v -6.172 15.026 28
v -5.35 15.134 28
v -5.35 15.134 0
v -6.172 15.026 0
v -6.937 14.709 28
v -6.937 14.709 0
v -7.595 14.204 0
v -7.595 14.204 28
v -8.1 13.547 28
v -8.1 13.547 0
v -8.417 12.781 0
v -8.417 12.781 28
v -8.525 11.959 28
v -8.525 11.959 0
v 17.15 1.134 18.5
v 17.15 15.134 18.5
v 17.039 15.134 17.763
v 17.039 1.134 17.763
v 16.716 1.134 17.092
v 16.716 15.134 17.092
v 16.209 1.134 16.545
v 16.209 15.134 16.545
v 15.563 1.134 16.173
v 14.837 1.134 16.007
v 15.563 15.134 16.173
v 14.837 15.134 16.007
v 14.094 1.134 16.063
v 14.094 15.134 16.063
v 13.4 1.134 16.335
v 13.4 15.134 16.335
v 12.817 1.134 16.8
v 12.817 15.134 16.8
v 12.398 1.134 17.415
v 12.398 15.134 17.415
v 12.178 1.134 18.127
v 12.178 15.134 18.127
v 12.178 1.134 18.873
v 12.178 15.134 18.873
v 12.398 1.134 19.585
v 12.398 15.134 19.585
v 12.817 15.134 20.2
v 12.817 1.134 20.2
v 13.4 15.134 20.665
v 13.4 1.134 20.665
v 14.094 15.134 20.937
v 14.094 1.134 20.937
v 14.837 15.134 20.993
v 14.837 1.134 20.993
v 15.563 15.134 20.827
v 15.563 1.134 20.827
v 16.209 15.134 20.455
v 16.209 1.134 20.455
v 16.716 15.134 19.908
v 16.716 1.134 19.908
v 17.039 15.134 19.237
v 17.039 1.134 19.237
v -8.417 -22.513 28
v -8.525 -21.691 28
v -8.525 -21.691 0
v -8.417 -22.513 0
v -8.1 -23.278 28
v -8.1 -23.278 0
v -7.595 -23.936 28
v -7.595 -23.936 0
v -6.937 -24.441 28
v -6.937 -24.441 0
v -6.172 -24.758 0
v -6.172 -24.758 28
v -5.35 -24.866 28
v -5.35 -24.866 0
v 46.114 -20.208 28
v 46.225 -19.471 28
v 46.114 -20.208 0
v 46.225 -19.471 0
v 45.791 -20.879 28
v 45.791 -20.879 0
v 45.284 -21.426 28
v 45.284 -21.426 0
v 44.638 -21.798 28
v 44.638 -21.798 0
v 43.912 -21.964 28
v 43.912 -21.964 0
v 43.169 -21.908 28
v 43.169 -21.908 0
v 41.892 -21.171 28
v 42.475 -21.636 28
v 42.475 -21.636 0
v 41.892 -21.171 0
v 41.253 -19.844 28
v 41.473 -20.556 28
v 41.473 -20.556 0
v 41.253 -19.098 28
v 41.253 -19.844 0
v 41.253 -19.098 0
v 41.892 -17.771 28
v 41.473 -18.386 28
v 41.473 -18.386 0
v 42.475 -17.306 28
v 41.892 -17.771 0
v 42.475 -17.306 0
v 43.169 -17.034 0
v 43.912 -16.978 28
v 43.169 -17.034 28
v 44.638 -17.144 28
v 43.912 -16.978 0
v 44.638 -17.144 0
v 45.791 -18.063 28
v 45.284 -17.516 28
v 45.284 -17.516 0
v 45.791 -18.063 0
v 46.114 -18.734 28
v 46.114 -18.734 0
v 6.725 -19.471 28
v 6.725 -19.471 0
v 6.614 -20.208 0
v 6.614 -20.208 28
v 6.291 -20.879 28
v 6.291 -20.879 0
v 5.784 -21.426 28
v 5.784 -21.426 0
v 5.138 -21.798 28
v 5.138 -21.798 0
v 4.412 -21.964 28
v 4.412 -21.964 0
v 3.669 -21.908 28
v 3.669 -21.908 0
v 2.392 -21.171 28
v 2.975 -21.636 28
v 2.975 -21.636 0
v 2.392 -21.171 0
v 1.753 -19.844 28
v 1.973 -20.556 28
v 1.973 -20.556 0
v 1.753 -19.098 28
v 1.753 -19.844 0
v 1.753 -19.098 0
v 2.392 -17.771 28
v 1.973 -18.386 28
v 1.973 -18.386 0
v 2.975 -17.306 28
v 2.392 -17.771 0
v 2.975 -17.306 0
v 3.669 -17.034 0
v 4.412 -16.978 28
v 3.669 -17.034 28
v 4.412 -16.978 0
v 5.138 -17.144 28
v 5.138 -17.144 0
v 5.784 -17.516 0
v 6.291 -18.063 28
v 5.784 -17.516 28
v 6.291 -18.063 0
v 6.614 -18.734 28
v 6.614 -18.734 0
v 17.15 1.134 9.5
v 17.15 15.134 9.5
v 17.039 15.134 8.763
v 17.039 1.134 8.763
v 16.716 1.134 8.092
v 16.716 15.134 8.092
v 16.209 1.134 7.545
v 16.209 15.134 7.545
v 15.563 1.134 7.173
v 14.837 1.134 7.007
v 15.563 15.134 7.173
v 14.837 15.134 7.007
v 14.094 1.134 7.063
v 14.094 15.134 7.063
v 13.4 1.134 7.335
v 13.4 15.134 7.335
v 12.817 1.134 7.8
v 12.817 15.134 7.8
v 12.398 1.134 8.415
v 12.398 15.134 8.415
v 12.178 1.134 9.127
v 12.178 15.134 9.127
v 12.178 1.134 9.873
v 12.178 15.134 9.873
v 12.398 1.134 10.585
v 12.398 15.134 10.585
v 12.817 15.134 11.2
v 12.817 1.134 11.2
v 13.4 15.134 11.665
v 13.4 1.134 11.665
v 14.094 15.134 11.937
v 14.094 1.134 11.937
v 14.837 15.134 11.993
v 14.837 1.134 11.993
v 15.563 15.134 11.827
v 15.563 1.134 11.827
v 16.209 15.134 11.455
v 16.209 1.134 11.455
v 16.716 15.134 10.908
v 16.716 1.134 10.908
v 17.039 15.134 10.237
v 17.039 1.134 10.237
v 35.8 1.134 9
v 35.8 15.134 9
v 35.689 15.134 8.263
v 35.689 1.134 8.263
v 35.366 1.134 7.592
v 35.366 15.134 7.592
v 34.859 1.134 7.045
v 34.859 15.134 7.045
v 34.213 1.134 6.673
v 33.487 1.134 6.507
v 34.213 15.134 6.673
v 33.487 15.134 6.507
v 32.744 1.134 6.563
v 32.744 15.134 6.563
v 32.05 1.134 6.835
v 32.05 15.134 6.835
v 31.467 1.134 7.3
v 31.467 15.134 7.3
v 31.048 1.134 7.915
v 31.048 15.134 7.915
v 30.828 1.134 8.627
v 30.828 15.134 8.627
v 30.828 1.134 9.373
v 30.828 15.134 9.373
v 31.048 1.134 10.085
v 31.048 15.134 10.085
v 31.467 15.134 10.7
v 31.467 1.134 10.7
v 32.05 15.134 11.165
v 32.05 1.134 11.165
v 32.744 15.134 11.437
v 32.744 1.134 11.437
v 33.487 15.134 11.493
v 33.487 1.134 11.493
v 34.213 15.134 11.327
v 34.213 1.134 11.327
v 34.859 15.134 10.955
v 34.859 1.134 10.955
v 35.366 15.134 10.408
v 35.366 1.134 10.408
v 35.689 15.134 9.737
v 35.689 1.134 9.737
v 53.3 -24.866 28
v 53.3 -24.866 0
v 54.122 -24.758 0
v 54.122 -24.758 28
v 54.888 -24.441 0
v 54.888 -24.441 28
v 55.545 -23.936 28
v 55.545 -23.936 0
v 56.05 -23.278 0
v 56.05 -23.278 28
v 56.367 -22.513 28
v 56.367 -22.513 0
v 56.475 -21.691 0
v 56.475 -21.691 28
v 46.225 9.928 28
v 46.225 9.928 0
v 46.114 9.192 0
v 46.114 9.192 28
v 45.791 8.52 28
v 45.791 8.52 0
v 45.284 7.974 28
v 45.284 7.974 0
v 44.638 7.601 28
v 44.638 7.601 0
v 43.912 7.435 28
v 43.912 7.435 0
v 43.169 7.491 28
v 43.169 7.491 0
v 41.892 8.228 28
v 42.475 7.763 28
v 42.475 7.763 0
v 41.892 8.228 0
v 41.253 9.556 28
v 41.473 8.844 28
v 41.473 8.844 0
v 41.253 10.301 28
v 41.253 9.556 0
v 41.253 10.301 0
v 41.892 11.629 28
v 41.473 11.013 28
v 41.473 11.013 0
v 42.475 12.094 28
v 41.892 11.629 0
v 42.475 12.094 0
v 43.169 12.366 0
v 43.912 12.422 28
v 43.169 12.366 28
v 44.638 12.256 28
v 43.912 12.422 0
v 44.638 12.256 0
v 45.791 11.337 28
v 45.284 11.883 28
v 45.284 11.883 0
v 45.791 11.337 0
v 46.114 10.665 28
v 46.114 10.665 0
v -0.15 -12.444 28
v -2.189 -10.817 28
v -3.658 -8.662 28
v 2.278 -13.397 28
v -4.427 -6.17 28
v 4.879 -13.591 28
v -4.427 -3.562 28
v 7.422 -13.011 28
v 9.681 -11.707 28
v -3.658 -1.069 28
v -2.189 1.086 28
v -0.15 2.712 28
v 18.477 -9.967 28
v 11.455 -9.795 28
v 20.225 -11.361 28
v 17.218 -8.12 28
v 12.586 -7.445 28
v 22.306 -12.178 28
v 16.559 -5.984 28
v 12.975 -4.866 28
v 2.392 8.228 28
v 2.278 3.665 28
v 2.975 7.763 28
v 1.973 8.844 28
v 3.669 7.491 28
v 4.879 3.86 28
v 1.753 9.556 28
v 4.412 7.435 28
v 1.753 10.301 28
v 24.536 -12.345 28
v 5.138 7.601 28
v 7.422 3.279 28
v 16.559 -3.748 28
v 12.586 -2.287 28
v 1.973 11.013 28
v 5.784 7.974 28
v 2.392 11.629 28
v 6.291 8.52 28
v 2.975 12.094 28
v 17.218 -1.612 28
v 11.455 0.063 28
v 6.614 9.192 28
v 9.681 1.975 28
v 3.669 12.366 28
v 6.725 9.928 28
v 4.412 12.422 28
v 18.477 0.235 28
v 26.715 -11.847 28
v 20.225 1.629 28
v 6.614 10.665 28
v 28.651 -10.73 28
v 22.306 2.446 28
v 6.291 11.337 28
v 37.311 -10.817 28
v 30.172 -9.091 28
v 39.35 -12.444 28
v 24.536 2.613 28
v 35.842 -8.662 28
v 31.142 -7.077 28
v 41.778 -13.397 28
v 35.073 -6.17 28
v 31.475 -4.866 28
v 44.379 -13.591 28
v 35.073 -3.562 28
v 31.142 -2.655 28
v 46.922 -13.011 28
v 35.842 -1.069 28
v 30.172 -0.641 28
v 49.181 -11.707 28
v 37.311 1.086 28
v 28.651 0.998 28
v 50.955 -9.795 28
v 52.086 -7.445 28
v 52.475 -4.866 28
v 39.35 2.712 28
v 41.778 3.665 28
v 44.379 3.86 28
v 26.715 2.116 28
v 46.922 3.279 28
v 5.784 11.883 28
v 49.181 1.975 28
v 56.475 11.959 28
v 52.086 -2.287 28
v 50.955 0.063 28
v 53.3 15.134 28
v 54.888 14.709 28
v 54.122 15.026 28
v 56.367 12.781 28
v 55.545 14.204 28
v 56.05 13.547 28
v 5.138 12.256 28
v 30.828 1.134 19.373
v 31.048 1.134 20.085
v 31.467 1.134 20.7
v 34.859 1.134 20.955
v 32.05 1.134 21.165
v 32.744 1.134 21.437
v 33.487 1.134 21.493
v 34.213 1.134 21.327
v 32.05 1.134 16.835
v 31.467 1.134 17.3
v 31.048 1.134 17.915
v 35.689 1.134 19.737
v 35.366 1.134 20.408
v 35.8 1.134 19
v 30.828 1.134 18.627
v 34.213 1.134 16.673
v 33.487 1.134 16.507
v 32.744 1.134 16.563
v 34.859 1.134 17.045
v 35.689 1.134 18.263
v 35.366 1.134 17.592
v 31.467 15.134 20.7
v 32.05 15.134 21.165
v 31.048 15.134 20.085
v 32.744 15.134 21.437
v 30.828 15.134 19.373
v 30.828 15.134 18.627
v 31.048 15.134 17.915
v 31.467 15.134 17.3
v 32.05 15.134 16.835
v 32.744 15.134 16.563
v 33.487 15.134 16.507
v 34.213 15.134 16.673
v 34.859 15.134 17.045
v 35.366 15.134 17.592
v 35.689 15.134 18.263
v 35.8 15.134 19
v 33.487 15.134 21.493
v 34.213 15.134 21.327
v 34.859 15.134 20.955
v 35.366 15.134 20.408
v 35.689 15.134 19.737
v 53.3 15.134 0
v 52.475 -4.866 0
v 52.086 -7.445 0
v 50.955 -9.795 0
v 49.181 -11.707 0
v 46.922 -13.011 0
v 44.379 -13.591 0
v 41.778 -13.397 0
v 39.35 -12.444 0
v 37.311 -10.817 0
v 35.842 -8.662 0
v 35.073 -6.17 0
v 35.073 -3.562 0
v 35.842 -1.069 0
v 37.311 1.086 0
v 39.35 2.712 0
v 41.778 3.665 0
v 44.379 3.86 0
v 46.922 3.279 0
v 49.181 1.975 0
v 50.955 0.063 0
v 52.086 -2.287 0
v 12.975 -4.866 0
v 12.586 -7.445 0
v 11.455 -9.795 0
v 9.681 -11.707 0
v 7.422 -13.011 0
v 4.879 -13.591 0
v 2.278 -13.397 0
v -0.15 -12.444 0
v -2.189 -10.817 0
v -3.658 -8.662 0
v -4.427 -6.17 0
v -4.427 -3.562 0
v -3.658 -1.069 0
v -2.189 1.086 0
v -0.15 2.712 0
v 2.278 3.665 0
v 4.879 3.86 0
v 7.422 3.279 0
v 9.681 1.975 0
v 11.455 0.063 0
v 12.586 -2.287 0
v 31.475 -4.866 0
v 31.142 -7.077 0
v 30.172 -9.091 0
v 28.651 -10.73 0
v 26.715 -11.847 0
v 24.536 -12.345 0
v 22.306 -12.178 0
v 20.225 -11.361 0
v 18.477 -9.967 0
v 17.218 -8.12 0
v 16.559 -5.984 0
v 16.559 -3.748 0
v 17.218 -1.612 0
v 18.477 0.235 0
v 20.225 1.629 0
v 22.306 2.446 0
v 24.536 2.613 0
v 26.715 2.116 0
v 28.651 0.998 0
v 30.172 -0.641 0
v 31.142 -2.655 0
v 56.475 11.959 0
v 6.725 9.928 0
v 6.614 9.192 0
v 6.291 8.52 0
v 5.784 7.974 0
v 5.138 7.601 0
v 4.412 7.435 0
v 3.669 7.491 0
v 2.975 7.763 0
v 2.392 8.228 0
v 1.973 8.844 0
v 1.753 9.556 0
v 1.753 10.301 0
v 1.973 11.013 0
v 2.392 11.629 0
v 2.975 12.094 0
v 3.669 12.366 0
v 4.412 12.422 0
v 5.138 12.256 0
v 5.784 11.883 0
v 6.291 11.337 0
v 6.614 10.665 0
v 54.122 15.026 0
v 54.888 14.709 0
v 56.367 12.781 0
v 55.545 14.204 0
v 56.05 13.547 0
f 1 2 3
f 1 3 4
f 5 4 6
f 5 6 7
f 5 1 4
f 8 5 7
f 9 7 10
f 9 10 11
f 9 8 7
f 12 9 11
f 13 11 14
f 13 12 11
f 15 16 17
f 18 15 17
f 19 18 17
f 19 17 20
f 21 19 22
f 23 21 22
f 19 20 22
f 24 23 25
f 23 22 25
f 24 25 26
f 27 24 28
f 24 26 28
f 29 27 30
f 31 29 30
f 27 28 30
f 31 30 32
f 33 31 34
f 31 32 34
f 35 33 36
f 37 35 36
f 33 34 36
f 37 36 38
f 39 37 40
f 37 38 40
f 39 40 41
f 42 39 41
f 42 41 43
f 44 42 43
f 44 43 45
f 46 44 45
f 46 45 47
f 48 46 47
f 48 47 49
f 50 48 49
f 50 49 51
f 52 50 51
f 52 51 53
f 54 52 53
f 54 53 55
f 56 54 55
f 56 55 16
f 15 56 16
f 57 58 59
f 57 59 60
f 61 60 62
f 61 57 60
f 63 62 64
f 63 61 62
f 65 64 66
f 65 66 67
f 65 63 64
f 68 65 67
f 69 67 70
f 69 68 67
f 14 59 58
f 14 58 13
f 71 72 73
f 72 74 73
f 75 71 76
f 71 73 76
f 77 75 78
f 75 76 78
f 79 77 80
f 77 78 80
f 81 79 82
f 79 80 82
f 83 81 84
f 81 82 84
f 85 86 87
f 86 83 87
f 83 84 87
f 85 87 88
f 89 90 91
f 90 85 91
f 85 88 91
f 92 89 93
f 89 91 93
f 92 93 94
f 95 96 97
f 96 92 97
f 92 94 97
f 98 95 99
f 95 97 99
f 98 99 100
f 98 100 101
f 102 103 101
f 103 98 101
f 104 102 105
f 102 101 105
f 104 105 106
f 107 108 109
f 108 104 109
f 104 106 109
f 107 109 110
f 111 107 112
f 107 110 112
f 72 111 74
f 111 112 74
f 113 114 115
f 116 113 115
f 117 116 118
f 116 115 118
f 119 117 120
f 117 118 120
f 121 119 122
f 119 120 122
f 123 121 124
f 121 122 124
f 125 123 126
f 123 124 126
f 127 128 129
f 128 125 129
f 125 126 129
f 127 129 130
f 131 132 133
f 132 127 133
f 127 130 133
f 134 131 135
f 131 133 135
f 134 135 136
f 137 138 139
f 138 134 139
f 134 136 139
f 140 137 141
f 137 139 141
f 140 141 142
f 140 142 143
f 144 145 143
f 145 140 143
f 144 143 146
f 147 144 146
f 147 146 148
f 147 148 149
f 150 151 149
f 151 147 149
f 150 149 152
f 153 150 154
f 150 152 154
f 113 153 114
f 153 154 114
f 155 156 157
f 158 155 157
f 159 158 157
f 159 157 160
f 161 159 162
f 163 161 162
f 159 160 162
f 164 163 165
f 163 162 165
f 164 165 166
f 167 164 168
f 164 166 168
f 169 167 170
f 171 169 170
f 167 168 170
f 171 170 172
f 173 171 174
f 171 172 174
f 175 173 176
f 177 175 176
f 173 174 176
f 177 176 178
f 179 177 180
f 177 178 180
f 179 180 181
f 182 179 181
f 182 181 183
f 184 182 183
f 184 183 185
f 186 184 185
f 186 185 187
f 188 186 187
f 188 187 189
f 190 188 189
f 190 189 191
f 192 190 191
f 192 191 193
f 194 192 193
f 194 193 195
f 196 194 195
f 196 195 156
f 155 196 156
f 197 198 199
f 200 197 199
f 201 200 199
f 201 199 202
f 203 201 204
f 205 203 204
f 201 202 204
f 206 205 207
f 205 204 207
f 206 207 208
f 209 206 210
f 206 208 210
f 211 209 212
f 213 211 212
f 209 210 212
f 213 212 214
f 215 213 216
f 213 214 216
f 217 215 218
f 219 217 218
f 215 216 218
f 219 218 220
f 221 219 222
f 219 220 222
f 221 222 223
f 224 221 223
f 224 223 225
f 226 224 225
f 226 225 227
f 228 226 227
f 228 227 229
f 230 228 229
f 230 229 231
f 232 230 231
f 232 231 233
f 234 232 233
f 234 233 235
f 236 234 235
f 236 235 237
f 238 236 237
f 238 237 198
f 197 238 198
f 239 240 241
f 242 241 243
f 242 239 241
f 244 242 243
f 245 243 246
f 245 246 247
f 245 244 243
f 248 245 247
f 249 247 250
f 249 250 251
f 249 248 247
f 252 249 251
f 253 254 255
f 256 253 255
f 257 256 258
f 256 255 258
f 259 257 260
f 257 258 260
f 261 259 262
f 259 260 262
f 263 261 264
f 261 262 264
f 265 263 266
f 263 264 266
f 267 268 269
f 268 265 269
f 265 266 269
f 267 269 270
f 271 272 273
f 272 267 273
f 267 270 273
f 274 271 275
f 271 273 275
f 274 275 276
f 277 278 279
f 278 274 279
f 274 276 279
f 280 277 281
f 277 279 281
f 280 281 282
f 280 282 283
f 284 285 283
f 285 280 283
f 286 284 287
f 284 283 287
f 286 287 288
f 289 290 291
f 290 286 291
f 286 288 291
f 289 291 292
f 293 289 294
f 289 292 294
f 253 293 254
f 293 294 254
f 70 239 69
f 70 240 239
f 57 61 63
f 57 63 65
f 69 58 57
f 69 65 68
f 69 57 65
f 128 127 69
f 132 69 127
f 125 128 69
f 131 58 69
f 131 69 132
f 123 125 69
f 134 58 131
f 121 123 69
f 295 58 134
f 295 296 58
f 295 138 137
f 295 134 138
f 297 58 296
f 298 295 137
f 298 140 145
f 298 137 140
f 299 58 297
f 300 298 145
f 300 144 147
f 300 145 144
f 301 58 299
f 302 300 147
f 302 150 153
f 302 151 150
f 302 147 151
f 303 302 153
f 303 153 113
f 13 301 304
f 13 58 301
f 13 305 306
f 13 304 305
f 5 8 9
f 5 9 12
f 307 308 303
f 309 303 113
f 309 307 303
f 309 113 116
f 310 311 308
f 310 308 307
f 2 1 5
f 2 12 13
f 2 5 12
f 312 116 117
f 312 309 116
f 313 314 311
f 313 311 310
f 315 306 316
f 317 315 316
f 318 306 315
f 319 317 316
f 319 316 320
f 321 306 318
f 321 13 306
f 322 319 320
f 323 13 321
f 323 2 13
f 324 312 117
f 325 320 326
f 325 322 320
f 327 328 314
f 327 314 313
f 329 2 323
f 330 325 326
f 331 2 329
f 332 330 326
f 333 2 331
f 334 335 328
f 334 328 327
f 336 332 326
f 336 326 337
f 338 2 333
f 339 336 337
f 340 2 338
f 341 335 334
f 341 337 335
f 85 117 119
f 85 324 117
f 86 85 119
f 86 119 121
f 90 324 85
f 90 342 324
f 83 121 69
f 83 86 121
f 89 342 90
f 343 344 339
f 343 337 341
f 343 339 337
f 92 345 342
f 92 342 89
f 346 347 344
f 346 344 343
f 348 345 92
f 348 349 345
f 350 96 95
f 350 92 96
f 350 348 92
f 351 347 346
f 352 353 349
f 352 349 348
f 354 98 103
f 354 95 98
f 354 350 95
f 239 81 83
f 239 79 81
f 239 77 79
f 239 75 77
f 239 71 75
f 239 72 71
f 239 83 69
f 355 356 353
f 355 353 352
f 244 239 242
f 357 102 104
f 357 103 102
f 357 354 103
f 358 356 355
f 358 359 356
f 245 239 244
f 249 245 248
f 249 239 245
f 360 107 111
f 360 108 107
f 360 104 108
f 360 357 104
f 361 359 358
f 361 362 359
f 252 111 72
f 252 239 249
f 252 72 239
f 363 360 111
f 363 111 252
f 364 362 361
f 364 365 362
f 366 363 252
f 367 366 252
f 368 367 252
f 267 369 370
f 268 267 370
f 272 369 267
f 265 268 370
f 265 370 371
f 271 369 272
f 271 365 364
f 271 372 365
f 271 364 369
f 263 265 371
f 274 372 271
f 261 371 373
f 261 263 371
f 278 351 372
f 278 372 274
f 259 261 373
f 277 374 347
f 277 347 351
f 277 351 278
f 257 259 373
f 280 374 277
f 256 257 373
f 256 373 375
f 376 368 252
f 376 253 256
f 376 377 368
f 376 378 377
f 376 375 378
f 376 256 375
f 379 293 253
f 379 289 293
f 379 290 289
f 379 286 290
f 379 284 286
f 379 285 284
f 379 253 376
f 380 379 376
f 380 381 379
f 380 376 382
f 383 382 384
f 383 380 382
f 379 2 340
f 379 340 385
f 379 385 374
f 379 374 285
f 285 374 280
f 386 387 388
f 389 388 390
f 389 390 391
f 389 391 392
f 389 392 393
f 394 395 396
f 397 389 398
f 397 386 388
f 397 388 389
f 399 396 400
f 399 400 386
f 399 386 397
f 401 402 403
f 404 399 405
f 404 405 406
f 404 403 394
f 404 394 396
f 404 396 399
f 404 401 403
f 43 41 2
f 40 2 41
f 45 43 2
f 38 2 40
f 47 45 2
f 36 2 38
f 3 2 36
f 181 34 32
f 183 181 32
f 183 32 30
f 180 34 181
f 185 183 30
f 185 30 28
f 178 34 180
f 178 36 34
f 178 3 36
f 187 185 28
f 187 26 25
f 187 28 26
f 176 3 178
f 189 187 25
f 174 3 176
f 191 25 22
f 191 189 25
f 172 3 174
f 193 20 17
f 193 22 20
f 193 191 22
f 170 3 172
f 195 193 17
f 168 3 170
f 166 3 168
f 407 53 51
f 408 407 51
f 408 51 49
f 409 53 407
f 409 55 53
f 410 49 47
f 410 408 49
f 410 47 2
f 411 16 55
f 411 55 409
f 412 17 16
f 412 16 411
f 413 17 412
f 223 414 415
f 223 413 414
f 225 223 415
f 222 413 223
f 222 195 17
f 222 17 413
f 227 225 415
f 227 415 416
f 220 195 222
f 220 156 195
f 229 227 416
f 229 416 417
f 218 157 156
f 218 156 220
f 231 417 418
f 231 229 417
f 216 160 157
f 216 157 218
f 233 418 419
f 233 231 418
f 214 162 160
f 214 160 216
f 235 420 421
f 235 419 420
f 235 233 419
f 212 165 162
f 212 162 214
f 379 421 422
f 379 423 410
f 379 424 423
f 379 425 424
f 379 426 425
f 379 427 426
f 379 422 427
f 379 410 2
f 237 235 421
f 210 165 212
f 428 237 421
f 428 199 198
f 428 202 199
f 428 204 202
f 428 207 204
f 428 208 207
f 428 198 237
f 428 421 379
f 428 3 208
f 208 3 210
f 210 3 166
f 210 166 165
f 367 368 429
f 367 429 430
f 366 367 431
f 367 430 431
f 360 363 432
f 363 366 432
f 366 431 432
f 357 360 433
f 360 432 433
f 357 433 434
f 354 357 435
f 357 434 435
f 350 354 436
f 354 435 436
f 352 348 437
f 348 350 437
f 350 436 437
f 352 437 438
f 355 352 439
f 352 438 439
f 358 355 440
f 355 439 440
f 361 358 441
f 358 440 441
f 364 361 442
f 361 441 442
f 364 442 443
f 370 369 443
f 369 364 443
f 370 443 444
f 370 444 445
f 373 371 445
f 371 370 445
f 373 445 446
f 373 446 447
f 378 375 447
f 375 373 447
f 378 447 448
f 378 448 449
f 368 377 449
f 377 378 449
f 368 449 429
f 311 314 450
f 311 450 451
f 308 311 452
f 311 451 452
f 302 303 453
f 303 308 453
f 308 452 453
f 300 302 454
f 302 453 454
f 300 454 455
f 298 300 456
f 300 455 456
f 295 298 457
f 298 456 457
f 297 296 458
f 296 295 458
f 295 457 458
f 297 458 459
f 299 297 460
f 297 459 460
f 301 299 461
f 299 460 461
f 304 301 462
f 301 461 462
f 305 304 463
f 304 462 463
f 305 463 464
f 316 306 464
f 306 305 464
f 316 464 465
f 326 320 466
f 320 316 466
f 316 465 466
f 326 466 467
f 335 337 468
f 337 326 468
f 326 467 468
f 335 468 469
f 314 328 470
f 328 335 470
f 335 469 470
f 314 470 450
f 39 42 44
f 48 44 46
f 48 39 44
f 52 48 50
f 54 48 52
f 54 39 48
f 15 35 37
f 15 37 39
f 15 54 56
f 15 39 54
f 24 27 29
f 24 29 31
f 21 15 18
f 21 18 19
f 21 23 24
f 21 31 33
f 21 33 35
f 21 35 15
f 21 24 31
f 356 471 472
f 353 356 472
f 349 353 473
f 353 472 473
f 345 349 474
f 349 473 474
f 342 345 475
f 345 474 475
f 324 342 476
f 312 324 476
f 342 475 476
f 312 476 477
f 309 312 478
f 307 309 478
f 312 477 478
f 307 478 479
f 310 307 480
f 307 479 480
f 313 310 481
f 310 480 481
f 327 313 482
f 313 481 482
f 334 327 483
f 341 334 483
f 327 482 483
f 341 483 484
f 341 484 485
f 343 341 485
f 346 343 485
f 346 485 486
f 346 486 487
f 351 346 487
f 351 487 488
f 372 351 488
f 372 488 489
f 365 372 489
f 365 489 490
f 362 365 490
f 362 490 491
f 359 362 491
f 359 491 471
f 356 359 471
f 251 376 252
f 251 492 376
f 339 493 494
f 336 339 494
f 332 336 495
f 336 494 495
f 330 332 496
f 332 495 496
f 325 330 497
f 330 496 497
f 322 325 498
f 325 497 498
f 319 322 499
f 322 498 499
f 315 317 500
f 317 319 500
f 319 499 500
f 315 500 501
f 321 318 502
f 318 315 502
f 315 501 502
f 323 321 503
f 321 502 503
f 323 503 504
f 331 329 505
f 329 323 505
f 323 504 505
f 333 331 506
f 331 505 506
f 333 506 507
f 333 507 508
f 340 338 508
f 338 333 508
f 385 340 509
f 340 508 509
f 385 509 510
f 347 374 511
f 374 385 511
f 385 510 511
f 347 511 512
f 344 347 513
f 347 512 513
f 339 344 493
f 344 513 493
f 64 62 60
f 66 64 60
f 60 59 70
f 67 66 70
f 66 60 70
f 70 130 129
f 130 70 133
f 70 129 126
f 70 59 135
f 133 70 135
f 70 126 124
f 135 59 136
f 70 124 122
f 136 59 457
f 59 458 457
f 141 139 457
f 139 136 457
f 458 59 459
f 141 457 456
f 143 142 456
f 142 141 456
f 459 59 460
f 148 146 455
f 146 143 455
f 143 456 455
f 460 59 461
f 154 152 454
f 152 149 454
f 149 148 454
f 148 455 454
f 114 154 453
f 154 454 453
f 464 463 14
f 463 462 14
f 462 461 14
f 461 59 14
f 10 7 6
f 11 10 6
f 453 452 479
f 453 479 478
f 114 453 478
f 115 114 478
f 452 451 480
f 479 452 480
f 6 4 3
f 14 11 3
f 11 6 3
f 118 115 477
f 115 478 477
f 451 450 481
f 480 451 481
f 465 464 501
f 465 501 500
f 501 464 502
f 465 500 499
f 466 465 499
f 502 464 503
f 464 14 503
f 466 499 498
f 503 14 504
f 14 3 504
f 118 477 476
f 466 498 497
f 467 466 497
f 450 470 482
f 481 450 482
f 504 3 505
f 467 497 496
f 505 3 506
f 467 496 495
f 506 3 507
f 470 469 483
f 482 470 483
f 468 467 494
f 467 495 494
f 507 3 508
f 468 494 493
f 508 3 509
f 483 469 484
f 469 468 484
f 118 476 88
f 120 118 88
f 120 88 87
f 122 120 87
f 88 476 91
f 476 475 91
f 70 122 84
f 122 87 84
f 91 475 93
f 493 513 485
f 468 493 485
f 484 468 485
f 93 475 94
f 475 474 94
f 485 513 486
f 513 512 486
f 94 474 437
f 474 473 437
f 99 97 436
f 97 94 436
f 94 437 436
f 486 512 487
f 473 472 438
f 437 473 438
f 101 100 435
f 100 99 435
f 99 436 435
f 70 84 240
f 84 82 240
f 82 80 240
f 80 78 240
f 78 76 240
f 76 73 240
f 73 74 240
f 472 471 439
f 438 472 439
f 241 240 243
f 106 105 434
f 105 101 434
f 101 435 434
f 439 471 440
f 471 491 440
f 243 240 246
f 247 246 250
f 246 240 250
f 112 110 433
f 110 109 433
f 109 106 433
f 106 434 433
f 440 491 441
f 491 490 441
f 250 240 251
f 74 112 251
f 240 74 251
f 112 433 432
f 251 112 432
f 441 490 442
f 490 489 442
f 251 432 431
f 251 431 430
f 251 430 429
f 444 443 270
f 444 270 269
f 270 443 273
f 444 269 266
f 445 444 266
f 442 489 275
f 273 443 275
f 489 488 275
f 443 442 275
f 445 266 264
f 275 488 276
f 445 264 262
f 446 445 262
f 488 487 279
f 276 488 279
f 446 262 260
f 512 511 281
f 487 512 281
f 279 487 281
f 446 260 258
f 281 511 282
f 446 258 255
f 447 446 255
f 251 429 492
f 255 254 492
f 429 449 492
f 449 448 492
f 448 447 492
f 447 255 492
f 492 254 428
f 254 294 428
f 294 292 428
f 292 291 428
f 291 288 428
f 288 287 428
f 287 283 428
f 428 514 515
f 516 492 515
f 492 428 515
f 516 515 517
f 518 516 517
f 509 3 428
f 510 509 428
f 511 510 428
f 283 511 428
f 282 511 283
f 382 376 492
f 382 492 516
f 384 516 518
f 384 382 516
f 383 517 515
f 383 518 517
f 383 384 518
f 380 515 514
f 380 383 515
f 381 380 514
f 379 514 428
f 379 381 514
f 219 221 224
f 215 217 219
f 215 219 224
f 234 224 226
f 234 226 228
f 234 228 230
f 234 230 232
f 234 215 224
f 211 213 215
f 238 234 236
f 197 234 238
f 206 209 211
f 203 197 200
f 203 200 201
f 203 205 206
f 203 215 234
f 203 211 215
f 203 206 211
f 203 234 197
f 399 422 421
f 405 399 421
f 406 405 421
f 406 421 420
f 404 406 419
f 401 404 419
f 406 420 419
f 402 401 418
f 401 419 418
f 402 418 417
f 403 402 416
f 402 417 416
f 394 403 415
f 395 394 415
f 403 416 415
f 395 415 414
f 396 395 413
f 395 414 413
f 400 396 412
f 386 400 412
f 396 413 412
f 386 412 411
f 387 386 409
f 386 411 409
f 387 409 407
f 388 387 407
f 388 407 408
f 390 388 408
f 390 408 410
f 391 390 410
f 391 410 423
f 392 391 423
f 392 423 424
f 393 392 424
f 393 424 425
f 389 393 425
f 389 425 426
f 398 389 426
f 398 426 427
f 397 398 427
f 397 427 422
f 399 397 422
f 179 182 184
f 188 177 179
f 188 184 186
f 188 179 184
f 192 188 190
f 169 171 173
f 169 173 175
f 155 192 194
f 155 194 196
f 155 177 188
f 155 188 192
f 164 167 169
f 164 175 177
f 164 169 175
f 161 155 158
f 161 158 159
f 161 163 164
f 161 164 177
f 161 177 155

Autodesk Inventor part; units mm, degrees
ref_plane "YZ Plane" through (0, 0, 0) normal (1, 0, 0) x (0, 1, 0)
ref_plane "XZ Plane" through (0, 0, 0) normal (0, 1, 0) x (-1, 0, 0)
ref_plane "XY Plane" through (0, 0, 0) normal (0, 0, 1) x (1, 0, 0)
sketch "Sketch1" plane through (0, 0, 0) normal (0, 0, 1) x (1, 0, 0)
  line L0 (-8.5249, 15.1341) -> (56.4751, 15.1341)
  line L1 (56.4751, 15.1341) -> (56.4751, -24.8659)
  line L2 (56.4751, -24.8659) -> (-8.5249, -24.8659)
  line L3 (-8.5249, -24.8659) -> (-8.5249, 15.1341)
  circle A0 centre (4.2251, -4.8659) radius 8.75
  line L4 (23.9751, 31.9095) -> (23.9751, -63.7078)
  circle A1 centre (43.7251, -4.8659) radius 8.75
  circle A2 centre (4.2251, 9.9285) radius 2.5
  circle A3 centre (4.2251, -19.471) radius 2.5
  circle A4 centre (43.7251, 9.9285) radius 2.5
  circle A5 centre (43.7251, -19.471) radius 2.5
  circle A6 centre (23.9751, -4.8659) radius 7.5
  point P0 (0, 0)
  dimension "d0" = 65
  dimension "d1" = 40
  dimension "d4" = 17.5
  dimension "d5" = 5
  dimension "d6" = 5
  dimension "d7" = 12.75
  dimension "d8" = 12.75
  dimension "d9" = 32.5
  dimension "d10" = 12.75
  dimension "d11" = 15
extrude "Extrusion1" add sketch "Sketch1" along normal blind 28 contours L0 L4 A6 L2 L3 | L0 L1 L2 L4 A6
fillet "Fillet1" radius 3.175 4 edges at (-8.5249, 15.1341, 14) (56.4751, 15.1341, 14) (56.4751, -24.8659, 14) (-8.5249, -24.8659, 14)
sketch "Sketch2" plane through (-5.3499, 15.1341, 0) normal (0, 1, 0) x (1, 0, 0)
  line L0 (58.65, 0) -> (58.65, -28) projected
  line L1 (0, 0) -> (58.65, 0) projected
  line L2 (0, -28) -> (0, 0) projected
  line L3 (0, -28) -> (58.65, -28) projected
  circle A0 centre (20, -9.5) radius 2.5
  circle A1 centre (38.65, -9) radius 2.5
  line L4 (-22.4443, -14) -> (82.6683, -14)
  circle A2 centre (20, -18.5) radius 2.5
  circle A3 centre (38.65, -19) radius 2.5
  point P0 (5.3499, 0)
  dimension "d15" = 5
  dimension "d16" = 5
  dimension "d19" = 20
  dimension "d21" = 20
  dimension "d22" = 4.5
  dimension "d23" = 5
  dimension "d24" = 14
  dimension "d25" = 28
extrude "Extrusion2" cut sketch "Sketch2" against normal blind 14 contours A0 | A1 | A2 | A3
thread "Thread1" size "12-24 UNC" class "2B" standard "ANSI Unified Screw Threads" full length
thread "Thread2" size "12-24 UNC" class "2B" standard "ANSI Unified Screw Threads" full length
thread "Thread3" size "12-24 UNC" class "2B" standard "ANSI Unified Screw Threads" full length
thread "Thread4" size "12-24 UNC" class "2B" standard "ANSI Unified Screw Threads" full length
equation "\"d7\" = d8"
equation "\"d10\" = d8"
equation "\"d21\" = d19"
equation "\"d23\" = d15"
equation "\"d24\" = 0.5 * d25"
properties part number "Mock Gearbox"
